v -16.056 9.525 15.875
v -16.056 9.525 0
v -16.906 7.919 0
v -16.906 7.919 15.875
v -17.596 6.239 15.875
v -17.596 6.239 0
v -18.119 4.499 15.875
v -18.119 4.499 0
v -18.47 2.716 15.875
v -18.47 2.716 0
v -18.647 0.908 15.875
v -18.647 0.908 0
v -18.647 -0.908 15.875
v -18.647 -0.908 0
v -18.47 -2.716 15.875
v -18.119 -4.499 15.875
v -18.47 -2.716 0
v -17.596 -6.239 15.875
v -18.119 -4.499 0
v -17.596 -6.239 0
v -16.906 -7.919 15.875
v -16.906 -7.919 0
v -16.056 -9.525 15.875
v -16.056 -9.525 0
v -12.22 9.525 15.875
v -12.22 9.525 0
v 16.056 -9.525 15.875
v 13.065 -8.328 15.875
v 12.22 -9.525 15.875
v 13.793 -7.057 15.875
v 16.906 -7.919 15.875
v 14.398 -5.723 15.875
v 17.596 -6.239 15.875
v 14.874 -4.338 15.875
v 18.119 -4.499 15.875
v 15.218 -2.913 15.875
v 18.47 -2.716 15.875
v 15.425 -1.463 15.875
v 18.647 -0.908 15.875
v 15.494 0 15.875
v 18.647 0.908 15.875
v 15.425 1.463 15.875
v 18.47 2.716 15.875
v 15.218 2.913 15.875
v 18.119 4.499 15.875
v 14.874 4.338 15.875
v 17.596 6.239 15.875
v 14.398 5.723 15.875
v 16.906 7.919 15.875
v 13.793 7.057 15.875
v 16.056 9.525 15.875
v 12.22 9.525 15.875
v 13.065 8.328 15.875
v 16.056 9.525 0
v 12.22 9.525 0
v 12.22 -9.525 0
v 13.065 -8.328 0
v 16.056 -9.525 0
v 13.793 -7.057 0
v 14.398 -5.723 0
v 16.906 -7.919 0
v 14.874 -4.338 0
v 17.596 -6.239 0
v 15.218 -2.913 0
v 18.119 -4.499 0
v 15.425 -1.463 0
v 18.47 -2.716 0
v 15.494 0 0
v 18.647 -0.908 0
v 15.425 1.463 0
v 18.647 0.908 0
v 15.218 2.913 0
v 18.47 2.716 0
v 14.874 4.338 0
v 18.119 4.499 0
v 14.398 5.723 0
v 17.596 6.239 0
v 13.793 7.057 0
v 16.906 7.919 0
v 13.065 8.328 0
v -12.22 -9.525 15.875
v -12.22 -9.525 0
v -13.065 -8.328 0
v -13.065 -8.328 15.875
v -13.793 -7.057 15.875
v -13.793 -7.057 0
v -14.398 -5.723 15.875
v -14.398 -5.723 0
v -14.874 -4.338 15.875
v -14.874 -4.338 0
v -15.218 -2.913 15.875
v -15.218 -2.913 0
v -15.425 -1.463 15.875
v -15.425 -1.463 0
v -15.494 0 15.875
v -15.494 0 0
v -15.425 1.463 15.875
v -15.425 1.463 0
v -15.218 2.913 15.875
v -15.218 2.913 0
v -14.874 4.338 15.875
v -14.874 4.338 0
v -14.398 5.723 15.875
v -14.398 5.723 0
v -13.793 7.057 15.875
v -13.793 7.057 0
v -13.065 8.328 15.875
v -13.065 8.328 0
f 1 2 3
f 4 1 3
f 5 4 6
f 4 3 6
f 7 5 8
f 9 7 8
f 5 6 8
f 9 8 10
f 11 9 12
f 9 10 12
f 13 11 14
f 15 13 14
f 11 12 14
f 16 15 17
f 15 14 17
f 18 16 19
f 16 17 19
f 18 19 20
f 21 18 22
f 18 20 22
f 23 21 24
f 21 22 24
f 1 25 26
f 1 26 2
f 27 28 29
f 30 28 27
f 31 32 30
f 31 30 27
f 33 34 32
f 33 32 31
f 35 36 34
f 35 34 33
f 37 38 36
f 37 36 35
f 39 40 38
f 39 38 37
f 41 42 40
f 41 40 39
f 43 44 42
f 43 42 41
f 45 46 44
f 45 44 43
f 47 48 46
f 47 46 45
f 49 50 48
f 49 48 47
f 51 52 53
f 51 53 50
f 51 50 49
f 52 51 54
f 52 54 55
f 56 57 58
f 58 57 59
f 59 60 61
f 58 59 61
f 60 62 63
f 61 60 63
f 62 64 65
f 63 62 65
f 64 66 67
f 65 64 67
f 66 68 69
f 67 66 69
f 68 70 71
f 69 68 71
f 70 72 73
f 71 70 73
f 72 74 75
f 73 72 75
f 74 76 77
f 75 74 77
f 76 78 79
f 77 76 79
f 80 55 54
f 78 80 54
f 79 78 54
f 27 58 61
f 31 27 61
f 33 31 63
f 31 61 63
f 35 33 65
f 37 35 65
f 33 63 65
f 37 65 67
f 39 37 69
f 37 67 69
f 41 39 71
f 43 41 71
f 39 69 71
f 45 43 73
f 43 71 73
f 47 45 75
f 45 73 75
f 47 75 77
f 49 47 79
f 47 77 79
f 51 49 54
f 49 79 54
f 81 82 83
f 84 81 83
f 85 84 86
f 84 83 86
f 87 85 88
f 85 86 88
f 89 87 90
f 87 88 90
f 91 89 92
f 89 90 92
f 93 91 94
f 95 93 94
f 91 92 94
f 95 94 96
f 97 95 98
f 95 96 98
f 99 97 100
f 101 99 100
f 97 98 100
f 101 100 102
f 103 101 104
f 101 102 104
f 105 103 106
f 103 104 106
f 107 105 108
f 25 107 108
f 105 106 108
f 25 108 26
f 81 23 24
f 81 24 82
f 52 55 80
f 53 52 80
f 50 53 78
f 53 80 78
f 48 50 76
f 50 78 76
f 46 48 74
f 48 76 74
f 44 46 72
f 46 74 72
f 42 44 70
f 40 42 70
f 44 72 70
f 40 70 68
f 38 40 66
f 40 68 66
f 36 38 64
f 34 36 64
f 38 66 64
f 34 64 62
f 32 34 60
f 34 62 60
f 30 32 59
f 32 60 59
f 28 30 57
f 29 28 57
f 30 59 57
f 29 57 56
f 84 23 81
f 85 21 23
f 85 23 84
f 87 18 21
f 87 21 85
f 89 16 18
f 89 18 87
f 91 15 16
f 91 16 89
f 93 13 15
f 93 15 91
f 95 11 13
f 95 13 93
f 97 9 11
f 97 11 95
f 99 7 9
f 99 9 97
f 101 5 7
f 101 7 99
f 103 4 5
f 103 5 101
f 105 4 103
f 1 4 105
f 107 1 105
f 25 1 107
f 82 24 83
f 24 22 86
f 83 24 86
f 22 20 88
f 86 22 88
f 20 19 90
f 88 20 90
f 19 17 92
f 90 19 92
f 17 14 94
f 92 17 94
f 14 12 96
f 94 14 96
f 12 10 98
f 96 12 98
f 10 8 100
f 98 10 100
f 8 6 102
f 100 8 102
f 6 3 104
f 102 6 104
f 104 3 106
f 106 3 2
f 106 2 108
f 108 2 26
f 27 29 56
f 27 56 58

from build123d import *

# Parameters (mm, degrees)
F1_DEPTH = 15.875


with BuildPart() as f1:
    # F0 (on Top) → F1 (new body)
    with BuildSketch(Plane.XY):
        with BuildLine():
            ThreePointArc((-12.22041, -9.525), (-15.494, 0), (-12.22041, 9.525))
            Line((-12.22041, 9.525), (-16.056336, 9.525))
            ThreePointArc((-16.056336, 9.525), (-18.669, 0), (-16.056336, -9.525))
            Line((-16.056336, -9.525), (-12.22041, -9.525))
        make_face()
        with BuildLine():
            Line((16.056336, 9.525), (12.22041, 9.525))
            ThreePointArc((12.22041, 9.525), (15.494, 0), (12.22041, -9.525))
            Line((12.22041, -9.525), (16.056336, -9.525))
            ThreePointArc((16.056336, -9.525), (18.669, 0), (16.056336, 9.525))
        make_face()
    extrude(amount=F1_DEPTH)


solid = f1.part
